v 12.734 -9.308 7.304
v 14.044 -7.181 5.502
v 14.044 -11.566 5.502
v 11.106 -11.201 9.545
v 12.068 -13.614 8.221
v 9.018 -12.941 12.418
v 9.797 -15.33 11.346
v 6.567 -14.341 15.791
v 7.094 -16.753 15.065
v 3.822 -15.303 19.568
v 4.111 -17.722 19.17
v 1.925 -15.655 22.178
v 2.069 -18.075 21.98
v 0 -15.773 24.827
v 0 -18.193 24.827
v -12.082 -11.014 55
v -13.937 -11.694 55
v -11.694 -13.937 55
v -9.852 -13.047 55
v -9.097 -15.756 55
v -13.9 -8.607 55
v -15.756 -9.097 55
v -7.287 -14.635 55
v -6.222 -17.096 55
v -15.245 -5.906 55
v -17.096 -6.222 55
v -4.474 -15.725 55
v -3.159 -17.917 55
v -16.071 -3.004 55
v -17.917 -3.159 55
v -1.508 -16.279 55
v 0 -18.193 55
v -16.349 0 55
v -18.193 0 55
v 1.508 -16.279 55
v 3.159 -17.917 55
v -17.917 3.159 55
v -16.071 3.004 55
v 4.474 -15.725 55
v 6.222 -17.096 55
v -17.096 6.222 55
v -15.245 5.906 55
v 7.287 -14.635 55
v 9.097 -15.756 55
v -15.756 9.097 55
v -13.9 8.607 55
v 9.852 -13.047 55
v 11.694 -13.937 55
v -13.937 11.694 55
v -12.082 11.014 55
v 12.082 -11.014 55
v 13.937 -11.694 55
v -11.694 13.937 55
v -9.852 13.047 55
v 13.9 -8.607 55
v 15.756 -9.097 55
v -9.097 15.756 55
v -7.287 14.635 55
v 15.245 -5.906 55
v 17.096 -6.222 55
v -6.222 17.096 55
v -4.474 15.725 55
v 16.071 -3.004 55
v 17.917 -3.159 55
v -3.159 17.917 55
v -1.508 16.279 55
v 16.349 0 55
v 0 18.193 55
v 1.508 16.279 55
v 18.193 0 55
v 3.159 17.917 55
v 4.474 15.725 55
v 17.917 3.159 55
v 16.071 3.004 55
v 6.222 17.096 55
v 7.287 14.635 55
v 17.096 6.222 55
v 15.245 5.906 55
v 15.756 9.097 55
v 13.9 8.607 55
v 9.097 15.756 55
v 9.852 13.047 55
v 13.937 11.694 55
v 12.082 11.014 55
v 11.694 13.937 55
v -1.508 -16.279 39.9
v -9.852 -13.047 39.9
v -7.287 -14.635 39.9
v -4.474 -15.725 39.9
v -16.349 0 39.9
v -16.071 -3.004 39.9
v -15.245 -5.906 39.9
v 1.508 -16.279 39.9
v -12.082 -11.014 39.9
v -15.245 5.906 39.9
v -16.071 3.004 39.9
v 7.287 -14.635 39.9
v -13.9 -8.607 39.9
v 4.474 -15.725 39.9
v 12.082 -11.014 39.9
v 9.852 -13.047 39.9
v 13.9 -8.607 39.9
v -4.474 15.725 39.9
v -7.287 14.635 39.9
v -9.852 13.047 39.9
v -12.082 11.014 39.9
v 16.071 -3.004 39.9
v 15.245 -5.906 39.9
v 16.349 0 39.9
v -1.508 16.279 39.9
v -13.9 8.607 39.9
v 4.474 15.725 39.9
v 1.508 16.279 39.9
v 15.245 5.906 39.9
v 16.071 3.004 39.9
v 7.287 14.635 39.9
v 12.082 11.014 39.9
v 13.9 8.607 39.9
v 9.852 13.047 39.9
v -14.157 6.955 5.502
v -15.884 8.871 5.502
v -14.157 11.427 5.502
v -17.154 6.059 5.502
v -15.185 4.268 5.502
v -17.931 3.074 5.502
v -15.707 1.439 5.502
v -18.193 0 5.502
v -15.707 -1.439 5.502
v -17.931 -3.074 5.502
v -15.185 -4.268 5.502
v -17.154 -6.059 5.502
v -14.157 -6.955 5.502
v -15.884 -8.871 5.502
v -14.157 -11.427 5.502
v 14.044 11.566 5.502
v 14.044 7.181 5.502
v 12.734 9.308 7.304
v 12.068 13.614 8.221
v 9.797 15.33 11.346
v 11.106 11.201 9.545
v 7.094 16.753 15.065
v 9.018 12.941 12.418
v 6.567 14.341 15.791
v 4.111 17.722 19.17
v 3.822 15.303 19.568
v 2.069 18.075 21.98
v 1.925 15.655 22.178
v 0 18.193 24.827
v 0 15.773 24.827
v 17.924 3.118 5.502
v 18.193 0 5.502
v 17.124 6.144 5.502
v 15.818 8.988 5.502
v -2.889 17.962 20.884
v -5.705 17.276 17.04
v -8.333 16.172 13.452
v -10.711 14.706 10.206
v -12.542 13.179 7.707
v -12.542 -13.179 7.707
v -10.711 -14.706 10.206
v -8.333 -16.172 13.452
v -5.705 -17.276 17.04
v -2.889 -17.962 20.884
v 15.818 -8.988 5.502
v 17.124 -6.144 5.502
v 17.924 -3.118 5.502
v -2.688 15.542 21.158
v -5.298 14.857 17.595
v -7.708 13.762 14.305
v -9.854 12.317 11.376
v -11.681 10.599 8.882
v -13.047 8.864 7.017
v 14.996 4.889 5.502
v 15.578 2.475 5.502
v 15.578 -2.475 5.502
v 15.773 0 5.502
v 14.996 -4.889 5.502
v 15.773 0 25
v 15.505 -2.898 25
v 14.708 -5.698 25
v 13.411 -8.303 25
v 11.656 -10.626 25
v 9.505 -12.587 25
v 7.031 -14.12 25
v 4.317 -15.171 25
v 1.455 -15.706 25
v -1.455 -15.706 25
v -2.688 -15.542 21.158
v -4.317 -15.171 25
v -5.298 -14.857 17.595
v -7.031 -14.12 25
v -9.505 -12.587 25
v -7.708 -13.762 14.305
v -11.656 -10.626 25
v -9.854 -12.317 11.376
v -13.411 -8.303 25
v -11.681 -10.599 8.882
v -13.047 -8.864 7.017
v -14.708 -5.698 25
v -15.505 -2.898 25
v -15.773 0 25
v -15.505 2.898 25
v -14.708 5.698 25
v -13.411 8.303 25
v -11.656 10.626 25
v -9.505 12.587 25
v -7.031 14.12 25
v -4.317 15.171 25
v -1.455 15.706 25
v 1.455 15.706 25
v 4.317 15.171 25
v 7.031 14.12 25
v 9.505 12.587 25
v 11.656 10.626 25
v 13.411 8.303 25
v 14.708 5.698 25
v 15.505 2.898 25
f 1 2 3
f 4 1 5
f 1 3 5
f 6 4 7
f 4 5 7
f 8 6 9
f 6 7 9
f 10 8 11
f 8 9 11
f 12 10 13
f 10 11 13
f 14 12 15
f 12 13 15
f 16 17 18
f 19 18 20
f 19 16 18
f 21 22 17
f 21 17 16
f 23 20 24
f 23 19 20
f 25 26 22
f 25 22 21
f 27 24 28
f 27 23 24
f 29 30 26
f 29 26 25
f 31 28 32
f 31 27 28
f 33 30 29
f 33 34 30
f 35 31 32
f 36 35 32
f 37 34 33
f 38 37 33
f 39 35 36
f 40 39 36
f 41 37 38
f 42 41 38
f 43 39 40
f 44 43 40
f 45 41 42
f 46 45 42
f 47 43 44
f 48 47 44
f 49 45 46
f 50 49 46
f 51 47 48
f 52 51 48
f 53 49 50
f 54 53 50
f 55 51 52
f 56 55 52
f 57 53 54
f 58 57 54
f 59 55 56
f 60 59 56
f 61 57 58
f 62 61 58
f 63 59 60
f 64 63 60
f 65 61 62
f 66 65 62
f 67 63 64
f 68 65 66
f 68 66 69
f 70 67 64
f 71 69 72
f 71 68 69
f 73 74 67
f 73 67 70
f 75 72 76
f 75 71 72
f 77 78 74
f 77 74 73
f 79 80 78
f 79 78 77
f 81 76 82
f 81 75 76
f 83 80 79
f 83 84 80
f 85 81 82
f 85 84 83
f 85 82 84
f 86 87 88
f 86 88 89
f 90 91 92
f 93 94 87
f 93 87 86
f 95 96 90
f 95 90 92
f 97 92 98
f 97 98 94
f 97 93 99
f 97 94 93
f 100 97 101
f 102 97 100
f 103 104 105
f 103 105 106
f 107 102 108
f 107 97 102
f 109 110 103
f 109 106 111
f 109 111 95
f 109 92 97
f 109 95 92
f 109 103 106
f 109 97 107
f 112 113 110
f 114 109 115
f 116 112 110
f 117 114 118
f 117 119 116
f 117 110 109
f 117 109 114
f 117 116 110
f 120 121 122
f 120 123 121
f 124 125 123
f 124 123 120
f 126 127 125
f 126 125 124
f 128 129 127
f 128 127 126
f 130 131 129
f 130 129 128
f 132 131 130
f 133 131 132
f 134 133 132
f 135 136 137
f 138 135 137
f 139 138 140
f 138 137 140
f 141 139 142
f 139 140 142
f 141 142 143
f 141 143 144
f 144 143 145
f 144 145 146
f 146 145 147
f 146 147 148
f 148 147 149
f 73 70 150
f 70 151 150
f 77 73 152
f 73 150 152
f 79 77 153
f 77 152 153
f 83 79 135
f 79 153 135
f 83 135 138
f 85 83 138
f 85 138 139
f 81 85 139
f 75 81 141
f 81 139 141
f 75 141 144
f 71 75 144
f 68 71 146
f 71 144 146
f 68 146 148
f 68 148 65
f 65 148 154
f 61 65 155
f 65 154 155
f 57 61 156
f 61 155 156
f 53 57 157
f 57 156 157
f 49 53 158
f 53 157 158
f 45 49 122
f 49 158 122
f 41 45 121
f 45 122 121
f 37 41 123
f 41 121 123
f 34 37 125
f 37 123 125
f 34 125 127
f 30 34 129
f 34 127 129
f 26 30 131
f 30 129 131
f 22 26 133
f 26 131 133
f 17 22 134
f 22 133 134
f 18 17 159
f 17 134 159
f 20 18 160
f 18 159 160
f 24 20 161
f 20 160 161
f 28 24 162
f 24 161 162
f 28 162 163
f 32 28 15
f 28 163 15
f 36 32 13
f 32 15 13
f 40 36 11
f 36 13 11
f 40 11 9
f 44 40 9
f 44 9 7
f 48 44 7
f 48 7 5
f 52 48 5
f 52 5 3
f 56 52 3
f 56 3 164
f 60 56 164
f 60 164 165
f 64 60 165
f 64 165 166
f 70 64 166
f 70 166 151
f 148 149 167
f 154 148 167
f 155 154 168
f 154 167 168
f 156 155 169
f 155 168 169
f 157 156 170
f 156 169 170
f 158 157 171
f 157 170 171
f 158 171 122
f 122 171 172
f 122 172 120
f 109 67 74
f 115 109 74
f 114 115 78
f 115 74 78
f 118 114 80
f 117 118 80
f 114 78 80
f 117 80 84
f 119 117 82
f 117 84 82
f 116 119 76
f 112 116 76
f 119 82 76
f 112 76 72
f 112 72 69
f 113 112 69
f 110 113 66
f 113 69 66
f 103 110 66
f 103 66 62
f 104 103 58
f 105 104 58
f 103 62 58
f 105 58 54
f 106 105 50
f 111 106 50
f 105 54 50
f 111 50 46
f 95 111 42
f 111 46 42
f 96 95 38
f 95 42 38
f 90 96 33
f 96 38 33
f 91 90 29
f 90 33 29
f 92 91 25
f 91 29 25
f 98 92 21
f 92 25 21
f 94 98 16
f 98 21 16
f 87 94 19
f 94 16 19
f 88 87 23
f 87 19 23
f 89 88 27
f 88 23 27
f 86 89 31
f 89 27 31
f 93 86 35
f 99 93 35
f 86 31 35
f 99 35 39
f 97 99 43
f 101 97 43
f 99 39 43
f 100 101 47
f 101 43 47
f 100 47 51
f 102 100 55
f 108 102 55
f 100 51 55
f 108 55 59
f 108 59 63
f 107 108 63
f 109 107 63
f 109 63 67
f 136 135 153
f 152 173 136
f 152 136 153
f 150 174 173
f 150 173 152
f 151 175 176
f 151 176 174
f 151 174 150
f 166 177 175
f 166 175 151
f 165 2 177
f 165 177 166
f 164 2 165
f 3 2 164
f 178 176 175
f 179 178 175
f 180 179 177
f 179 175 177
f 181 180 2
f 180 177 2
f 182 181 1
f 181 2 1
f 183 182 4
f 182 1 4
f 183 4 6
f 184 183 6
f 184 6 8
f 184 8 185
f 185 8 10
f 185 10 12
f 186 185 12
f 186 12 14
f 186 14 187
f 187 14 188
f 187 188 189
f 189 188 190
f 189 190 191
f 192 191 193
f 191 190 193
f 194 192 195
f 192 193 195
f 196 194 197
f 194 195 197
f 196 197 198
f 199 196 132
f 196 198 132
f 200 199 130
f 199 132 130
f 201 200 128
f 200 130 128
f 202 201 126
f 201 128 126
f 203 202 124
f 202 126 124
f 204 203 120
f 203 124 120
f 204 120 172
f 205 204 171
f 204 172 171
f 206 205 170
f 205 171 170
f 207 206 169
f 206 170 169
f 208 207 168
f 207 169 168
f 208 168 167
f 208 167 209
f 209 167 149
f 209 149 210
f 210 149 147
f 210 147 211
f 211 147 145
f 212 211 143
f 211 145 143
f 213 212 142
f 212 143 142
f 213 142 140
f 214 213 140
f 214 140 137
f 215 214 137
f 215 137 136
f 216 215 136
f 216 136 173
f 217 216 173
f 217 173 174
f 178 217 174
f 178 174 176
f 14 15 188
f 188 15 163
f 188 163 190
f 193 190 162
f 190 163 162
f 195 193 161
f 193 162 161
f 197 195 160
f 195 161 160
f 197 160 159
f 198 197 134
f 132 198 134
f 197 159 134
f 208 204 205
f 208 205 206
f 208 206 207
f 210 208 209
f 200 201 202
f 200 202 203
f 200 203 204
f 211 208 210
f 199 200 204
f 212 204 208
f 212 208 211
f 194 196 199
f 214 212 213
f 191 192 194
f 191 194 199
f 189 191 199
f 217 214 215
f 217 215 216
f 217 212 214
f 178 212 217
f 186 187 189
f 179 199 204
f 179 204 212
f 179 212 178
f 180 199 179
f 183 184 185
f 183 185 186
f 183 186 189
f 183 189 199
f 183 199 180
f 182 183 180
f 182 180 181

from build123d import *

# Parameters (mm, degrees)
F0_R          = 18.1930467882
F1_DEPTH      = 30
F2_R          = 15.7731461296
F3_DEPTH      = 25
F5_DEPTH      = 25
F5_DEPTH_BACK = 25
F6_W          = 50.437502563
F6_H          = 30.6197889149
F7_DEPTH      = 25
F7_DEPTH_BACK = 25
F8_DEPTH      = 25
F9_R          = 16.3489622069
F10_DEPTH     = 15.1


with BuildPart() as f1:
    # F0 (on Top) → F1 (new body)
    with BuildSketch(Plane.XY):
        Circle(F0_R)
    extrude(amount=F1_DEPTH)

    # F2 (on face) → F3 (cut)
    with BuildSketch(Plane(origin=(0, 0, 0), x_dir=(1, 0, 0), z_dir=(0, 0, -1))):
        Circle(F2_R)
    extrude(amount=-F3_DEPTH, mode=Mode.SUBTRACT)

    # F4 (on Front) → F5 (cut, two sides)
    with BuildSketch(Plane.XZ) as f5_sk:
        Polygon((0, 24.8274412006), (-18.1874278933, 0), (18.0421601981, 0), align=None)
    extrude(amount=-F5_DEPTH, mode=Mode.SUBTRACT)
    extrude(f5_sk.sketch, amount=F5_DEPTH_BACK, mode=Mode.SUBTRACT)

    # F6 (on Front) → F7 (cut, two sides)
    with BuildSketch(Plane.XZ) as f7_sk:
        with Locations((0, -9.8076611757)):
            Rectangle(F6_W, F6_H)
    extrude(amount=-F7_DEPTH, mode=Mode.SUBTRACT)
    extrude(f7_sk.sketch, amount=F7_DEPTH_BACK, mode=Mode.SUBTRACT)

    # F8 (add): a face of the model
    f8_faces = [f1.faces().sort_by_distance(p)[0] for p in [
        (0, 0, 30),
    ]]
    extrude(f8_faces, amount=F8_DEPTH)

    # F9 (on face) → F10 (cut)
    with BuildSketch(Plane.XY.offset(55)):
        Circle(F9_R)
    extrude(amount=-F10_DEPTH, mode=Mode.SUBTRACT)


solid = f1.part
